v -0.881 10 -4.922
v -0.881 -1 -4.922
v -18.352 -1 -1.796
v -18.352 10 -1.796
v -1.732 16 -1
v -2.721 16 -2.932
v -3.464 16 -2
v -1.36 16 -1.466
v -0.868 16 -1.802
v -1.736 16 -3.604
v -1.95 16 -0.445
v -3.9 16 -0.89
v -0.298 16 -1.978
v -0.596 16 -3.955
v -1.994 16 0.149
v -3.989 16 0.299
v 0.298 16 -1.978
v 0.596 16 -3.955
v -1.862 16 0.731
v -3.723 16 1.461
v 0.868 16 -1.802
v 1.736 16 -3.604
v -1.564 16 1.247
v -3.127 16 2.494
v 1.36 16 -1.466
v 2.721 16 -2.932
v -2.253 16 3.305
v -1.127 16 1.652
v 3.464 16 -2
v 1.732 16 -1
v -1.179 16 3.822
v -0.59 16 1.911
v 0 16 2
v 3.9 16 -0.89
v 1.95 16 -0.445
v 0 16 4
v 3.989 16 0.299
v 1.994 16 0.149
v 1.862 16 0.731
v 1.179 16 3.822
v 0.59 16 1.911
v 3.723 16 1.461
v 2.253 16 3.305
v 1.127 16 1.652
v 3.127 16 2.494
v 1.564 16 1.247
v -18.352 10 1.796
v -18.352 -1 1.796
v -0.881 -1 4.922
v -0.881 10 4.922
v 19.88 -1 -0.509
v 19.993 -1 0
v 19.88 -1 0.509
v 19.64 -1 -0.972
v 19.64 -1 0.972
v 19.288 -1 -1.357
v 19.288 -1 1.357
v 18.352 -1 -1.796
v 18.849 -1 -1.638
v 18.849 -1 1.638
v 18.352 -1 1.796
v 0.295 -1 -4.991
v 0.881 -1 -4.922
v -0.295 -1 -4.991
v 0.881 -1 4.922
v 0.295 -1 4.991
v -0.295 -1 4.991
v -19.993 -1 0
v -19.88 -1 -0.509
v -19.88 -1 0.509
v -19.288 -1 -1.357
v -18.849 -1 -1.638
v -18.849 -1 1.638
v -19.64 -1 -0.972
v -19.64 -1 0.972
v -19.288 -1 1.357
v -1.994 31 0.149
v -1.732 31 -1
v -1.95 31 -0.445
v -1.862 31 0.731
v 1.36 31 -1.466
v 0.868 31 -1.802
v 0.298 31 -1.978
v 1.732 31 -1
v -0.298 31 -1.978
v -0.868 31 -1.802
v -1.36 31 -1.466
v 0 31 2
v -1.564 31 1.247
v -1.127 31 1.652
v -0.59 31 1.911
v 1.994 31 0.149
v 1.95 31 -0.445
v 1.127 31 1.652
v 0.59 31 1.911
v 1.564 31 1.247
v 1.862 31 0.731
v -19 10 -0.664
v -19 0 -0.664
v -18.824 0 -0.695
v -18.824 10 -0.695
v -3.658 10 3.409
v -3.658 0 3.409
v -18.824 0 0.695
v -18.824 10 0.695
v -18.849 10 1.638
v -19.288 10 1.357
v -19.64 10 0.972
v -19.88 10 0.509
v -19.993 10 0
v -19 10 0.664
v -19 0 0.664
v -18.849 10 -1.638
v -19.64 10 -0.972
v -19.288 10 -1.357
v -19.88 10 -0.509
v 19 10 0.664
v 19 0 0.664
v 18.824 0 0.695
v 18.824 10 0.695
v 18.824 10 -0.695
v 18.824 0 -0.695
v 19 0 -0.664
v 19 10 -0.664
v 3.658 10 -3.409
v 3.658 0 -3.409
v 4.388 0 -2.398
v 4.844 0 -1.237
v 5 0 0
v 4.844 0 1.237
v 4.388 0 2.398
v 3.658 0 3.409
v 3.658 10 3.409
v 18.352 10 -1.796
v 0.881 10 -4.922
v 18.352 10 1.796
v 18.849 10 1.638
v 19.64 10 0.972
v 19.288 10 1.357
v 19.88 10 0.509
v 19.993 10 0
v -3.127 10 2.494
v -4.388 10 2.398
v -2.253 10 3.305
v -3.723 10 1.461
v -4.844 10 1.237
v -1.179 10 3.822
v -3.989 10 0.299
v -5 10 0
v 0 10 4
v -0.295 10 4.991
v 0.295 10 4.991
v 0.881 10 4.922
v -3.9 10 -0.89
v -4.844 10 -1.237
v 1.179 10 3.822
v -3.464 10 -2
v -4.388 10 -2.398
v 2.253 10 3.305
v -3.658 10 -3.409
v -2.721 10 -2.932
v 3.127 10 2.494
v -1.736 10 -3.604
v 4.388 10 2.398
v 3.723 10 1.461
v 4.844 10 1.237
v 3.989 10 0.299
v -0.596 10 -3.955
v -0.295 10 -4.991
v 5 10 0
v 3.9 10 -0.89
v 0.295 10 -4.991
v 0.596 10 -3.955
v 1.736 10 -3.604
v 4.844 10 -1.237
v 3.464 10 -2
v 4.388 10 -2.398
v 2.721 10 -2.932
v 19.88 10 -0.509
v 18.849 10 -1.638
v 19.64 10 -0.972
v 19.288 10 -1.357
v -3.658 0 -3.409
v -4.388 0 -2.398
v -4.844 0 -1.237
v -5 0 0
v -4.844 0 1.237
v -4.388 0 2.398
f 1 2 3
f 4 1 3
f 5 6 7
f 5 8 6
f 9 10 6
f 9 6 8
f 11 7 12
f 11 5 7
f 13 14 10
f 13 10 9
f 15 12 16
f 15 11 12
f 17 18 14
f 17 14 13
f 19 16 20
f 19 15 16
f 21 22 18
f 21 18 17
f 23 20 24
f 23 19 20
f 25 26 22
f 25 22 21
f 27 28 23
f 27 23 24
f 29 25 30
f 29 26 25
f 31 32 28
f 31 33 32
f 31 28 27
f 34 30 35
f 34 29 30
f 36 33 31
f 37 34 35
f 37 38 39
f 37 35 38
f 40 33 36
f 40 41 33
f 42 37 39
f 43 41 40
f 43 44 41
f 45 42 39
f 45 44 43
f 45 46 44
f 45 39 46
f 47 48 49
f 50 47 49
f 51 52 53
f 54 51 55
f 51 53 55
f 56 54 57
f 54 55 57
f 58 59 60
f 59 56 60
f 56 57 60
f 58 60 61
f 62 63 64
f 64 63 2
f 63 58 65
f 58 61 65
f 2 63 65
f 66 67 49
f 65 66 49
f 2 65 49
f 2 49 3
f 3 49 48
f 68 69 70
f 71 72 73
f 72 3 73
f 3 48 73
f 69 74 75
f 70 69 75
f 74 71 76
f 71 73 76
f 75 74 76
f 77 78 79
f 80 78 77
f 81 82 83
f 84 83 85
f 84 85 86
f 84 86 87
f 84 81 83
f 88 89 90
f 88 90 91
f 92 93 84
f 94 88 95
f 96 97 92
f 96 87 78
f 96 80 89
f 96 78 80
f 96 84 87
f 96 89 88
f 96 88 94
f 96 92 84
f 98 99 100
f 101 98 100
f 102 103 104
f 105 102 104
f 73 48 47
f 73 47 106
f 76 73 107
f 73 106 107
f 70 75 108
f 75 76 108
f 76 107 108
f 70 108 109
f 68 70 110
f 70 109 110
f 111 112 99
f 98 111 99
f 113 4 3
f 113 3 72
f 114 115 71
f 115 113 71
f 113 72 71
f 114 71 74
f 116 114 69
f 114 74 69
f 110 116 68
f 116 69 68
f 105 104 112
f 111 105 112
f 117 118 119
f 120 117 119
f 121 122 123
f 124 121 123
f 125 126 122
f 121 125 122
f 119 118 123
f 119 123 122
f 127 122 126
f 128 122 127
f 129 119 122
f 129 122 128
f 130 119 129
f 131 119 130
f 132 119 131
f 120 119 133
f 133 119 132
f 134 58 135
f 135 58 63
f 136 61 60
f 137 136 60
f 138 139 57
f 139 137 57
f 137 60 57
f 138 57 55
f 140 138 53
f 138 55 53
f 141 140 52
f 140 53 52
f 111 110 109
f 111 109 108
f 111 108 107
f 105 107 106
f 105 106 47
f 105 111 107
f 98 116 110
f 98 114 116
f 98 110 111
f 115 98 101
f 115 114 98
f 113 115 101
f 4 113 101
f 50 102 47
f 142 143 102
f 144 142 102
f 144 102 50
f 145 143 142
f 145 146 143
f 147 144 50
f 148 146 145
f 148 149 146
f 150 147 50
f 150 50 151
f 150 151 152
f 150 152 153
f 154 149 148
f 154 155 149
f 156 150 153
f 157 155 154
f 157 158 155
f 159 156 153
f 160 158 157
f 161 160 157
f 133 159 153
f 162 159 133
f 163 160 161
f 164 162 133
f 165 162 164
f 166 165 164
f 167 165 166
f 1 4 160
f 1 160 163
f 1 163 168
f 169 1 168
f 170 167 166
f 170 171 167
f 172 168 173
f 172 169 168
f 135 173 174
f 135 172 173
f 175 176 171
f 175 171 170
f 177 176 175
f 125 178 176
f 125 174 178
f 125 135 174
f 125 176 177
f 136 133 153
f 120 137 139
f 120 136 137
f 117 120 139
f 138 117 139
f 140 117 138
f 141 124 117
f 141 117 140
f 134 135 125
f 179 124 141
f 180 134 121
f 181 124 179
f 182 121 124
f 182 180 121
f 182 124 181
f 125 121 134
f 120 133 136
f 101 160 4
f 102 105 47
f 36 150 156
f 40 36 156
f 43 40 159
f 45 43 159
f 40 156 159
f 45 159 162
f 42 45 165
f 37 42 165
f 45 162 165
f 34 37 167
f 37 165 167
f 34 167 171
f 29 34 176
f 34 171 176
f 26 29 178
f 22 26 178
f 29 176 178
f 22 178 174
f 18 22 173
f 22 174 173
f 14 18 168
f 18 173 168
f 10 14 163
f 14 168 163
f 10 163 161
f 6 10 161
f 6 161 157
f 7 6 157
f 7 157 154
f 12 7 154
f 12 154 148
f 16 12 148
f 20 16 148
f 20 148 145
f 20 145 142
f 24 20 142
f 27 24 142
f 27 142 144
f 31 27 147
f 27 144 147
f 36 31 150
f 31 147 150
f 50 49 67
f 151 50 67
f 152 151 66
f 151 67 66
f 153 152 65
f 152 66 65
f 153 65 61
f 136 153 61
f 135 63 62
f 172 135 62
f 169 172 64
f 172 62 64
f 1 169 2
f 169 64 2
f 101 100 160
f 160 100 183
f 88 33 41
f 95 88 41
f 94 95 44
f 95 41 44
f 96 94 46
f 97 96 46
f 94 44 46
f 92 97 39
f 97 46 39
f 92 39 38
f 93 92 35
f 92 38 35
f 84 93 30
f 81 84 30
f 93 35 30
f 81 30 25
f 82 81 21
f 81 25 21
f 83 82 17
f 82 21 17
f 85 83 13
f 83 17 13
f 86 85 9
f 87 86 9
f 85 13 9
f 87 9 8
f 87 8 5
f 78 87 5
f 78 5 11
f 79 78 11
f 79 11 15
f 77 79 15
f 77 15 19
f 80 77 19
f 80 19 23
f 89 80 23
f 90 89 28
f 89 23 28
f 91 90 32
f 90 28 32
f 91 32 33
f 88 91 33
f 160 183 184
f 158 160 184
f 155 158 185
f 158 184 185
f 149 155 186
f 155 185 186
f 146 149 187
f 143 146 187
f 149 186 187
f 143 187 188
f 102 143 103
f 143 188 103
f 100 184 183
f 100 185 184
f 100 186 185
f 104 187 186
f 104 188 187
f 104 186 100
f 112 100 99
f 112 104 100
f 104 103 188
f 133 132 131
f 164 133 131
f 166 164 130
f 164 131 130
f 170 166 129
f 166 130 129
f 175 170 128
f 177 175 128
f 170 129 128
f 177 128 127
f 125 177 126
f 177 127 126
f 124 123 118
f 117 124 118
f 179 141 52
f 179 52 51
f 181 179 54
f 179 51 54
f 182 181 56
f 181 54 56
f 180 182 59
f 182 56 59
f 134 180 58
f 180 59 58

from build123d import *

# Parameters (mm, degrees)
BOSS_EXTRUDE1_DEPTH = 10
BOSS_EXTRUDE2_START = 1
BOSS_EXTRUDE2_DEPTH = 1
SKETCH3_R           = 4
BOSS_EXTRUDE3_DEPTH = 6
SKETCH4_R           = 2
BOSS_EXTRUDE4_DEPTH = 15
FILLET1_R           = 2


with BuildPart() as part:
    # Sketch1 → Boss-Extrude1 (new body)
    with BuildSketch(Plane(origin=(0, 0, 0), x_dir=(1, 0, 0), z_dir=(0, 1, 0))):
        with BuildLine():
            Line((-20.000157194, 1.500878546), (-20.000157194, -1.500878546))
            Line((-20.000157194, -1.500878546), (-0.880639137, -4.921836518))
            ThreePointArc((-0.880639137, -4.921836518), (0, -5), (0.880639137, -4.921836518))
            Line((0.880639137, -4.921836518), (20.000157194, -1.500878546))
            Line((20.000157194, -1.500878546), (20.000157194, 1.500878546))
            Line((20.000157194, 1.500878546), (0.880639137, 4.921836518))
            ThreePointArc((0.880639137, 4.921836518), (0, 5), (-0.880639137, 4.921836518))
            Line((-0.880639137, 4.921836518), (-20.000157194, 1.500878546))
        make_face()
        with BuildLine():
            Line((-19.000157194, -0.663922493), (-19.000157194, 0.663922493))
            Line((-19.000157194, 0.663922493), (-18.824029366, 0.695436148))
            Line((-18.824029366, 0.695436148), (-3.65761322, 3.409085733))
            ThreePointArc((-3.65761322, 3.409085733), (-5, 0), (-3.65761322, -3.409085733))
            Line((-3.65761322, -3.409085733), (-18.824029366, -0.695436148))
            Line((-18.824029366, -0.695436148), (-19.000157194, -0.663922493))
        make_face(mode=Mode.SUBTRACT)
        with BuildLine():
            Line((18.824029366, 0.695436148), (19.000157194, 0.663922493))
            Line((19.000157194, 0.663922493), (19.000157194, -0.663922493))
            Line((19.000157194, -0.663922493), (18.824029366, -0.695436148))
            Line((18.824029366, -0.695436148), (3.65761322, -3.409085733))
            ThreePointArc((3.65761322, -3.409085733), (5, 0), (3.65761322, 3.409085733))
            Line((3.65761322, 3.409085733), (18.824029366, 0.695436148))
        make_face(mode=Mode.SUBTRACT)
    extrude(amount=BOSS_EXTRUDE1_DEPTH)

    # Sketch2 → Boss-Extrude2 (add)
    with BuildSketch(Plane.XZ.offset(BOSS_EXTRUDE2_START)):
        with BuildLine():
            Line((-20.000157194, 1.500878546), (-0.880639137, 4.921836518))
            ThreePointArc((-0.880639137, 4.921836518), (0, 5), (0.880639137, 4.921836518))
            Line((0.880639137, 4.921836518), (20.000157194, 1.500878546))
            Line((20.000157194, 1.500878546), (20.000157194, -1.500878546))
            Line((20.000157194, -1.500878546), (0.880639137, -4.921836518))
            ThreePointArc((0.880639137, -4.921836518), (0, -5), (-0.880639137, -4.921836518))
            Line((-0.880639137, -4.921836518), (-20.000157194, -1.500878546))
            Line((-20.000157194, -1.500878546), (-20.000157194, 1.500878546))
        make_face()
    extrude(amount=-BOSS_EXTRUDE2_DEPTH)

    # Sketch3 → Boss-Extrude3 (add)
    with BuildSketch(Plane(origin=(0, 10, 0), x_dir=(1, 0, 0), z_dir=(0, 1, 0))):
        with Locations(Location((0, 0, 0), (0, 0, 270))):
            Circle(SKETCH3_R)
    extrude(amount=BOSS_EXTRUDE3_DEPTH)

    # Sketch4 → Boss-Extrude4 (add)
    with BuildSketch(Plane(origin=(0, 16, 0), x_dir=(1, 0, 0), z_dir=(0, 1, 0))):
        with Locations(Location((0, 0, 0), (0, 0, 270))):
            Circle(SKETCH4_R)
    extrude(amount=BOSS_EXTRUDE4_DEPTH)

    # Fillet1
    # the kernel refuses this fillet: 2 mm, written as the material it takes off along each edge
    with BuildSketch(Plane(origin=(20.000157194, -5.184780263, 1.500878546), x_dir=(-0.9843673036221247, 0, 0.17612782732920945), z_dir=(0, 1, 0)), Plane(origin=(20.000157194, -5.184780263, -1.500878546), x_dir=(0, 0, 1), z_dir=(0, 1, 0)), Plane(origin=(-20.000157194, 14.184780263, 1.500878546), x_dir=(0.9843673036221245, 0, 0.17612782732920956), z_dir=(0, -1, 0))) as fillet1_piece_1:
        with BuildLine():
            CenterArc((FILLET1_R * 0.836956052521, -FILLET1_R), FILLET1_R, 90, 79.855702636)
            Line((-FILLET1_R * 0.147411251101, -FILLET1_R * 0.823872172671), (0, 0))
            Line((0, 0), (FILLET1_R * 0.836956052521, 0))
        make_face()
    extrude(amount=19.369560525, mode=Mode.SUBTRACT)
    with BuildSketch(Plane(origin=(-20.000157194, -5.184780263, -1.500878546), x_dir=(0, 0, 1), z_dir=(0, 1, 0))) as fillet1_piece_2:
        with BuildLine():
            CenterArc((FILLET1_R * 0.836956052521, FILLET1_R), FILLET1_R, 190.144297364, 79.855702636)
            Line((-FILLET1_R * 0.147411251101, FILLET1_R * 0.823872172671), (0, 0))
            Line((0, 0), (FILLET1_R * 0.836956052521, 0))
        make_face()
    extrude(amount=19.369560525, mode=Mode.SUBTRACT)


solid = part.part
